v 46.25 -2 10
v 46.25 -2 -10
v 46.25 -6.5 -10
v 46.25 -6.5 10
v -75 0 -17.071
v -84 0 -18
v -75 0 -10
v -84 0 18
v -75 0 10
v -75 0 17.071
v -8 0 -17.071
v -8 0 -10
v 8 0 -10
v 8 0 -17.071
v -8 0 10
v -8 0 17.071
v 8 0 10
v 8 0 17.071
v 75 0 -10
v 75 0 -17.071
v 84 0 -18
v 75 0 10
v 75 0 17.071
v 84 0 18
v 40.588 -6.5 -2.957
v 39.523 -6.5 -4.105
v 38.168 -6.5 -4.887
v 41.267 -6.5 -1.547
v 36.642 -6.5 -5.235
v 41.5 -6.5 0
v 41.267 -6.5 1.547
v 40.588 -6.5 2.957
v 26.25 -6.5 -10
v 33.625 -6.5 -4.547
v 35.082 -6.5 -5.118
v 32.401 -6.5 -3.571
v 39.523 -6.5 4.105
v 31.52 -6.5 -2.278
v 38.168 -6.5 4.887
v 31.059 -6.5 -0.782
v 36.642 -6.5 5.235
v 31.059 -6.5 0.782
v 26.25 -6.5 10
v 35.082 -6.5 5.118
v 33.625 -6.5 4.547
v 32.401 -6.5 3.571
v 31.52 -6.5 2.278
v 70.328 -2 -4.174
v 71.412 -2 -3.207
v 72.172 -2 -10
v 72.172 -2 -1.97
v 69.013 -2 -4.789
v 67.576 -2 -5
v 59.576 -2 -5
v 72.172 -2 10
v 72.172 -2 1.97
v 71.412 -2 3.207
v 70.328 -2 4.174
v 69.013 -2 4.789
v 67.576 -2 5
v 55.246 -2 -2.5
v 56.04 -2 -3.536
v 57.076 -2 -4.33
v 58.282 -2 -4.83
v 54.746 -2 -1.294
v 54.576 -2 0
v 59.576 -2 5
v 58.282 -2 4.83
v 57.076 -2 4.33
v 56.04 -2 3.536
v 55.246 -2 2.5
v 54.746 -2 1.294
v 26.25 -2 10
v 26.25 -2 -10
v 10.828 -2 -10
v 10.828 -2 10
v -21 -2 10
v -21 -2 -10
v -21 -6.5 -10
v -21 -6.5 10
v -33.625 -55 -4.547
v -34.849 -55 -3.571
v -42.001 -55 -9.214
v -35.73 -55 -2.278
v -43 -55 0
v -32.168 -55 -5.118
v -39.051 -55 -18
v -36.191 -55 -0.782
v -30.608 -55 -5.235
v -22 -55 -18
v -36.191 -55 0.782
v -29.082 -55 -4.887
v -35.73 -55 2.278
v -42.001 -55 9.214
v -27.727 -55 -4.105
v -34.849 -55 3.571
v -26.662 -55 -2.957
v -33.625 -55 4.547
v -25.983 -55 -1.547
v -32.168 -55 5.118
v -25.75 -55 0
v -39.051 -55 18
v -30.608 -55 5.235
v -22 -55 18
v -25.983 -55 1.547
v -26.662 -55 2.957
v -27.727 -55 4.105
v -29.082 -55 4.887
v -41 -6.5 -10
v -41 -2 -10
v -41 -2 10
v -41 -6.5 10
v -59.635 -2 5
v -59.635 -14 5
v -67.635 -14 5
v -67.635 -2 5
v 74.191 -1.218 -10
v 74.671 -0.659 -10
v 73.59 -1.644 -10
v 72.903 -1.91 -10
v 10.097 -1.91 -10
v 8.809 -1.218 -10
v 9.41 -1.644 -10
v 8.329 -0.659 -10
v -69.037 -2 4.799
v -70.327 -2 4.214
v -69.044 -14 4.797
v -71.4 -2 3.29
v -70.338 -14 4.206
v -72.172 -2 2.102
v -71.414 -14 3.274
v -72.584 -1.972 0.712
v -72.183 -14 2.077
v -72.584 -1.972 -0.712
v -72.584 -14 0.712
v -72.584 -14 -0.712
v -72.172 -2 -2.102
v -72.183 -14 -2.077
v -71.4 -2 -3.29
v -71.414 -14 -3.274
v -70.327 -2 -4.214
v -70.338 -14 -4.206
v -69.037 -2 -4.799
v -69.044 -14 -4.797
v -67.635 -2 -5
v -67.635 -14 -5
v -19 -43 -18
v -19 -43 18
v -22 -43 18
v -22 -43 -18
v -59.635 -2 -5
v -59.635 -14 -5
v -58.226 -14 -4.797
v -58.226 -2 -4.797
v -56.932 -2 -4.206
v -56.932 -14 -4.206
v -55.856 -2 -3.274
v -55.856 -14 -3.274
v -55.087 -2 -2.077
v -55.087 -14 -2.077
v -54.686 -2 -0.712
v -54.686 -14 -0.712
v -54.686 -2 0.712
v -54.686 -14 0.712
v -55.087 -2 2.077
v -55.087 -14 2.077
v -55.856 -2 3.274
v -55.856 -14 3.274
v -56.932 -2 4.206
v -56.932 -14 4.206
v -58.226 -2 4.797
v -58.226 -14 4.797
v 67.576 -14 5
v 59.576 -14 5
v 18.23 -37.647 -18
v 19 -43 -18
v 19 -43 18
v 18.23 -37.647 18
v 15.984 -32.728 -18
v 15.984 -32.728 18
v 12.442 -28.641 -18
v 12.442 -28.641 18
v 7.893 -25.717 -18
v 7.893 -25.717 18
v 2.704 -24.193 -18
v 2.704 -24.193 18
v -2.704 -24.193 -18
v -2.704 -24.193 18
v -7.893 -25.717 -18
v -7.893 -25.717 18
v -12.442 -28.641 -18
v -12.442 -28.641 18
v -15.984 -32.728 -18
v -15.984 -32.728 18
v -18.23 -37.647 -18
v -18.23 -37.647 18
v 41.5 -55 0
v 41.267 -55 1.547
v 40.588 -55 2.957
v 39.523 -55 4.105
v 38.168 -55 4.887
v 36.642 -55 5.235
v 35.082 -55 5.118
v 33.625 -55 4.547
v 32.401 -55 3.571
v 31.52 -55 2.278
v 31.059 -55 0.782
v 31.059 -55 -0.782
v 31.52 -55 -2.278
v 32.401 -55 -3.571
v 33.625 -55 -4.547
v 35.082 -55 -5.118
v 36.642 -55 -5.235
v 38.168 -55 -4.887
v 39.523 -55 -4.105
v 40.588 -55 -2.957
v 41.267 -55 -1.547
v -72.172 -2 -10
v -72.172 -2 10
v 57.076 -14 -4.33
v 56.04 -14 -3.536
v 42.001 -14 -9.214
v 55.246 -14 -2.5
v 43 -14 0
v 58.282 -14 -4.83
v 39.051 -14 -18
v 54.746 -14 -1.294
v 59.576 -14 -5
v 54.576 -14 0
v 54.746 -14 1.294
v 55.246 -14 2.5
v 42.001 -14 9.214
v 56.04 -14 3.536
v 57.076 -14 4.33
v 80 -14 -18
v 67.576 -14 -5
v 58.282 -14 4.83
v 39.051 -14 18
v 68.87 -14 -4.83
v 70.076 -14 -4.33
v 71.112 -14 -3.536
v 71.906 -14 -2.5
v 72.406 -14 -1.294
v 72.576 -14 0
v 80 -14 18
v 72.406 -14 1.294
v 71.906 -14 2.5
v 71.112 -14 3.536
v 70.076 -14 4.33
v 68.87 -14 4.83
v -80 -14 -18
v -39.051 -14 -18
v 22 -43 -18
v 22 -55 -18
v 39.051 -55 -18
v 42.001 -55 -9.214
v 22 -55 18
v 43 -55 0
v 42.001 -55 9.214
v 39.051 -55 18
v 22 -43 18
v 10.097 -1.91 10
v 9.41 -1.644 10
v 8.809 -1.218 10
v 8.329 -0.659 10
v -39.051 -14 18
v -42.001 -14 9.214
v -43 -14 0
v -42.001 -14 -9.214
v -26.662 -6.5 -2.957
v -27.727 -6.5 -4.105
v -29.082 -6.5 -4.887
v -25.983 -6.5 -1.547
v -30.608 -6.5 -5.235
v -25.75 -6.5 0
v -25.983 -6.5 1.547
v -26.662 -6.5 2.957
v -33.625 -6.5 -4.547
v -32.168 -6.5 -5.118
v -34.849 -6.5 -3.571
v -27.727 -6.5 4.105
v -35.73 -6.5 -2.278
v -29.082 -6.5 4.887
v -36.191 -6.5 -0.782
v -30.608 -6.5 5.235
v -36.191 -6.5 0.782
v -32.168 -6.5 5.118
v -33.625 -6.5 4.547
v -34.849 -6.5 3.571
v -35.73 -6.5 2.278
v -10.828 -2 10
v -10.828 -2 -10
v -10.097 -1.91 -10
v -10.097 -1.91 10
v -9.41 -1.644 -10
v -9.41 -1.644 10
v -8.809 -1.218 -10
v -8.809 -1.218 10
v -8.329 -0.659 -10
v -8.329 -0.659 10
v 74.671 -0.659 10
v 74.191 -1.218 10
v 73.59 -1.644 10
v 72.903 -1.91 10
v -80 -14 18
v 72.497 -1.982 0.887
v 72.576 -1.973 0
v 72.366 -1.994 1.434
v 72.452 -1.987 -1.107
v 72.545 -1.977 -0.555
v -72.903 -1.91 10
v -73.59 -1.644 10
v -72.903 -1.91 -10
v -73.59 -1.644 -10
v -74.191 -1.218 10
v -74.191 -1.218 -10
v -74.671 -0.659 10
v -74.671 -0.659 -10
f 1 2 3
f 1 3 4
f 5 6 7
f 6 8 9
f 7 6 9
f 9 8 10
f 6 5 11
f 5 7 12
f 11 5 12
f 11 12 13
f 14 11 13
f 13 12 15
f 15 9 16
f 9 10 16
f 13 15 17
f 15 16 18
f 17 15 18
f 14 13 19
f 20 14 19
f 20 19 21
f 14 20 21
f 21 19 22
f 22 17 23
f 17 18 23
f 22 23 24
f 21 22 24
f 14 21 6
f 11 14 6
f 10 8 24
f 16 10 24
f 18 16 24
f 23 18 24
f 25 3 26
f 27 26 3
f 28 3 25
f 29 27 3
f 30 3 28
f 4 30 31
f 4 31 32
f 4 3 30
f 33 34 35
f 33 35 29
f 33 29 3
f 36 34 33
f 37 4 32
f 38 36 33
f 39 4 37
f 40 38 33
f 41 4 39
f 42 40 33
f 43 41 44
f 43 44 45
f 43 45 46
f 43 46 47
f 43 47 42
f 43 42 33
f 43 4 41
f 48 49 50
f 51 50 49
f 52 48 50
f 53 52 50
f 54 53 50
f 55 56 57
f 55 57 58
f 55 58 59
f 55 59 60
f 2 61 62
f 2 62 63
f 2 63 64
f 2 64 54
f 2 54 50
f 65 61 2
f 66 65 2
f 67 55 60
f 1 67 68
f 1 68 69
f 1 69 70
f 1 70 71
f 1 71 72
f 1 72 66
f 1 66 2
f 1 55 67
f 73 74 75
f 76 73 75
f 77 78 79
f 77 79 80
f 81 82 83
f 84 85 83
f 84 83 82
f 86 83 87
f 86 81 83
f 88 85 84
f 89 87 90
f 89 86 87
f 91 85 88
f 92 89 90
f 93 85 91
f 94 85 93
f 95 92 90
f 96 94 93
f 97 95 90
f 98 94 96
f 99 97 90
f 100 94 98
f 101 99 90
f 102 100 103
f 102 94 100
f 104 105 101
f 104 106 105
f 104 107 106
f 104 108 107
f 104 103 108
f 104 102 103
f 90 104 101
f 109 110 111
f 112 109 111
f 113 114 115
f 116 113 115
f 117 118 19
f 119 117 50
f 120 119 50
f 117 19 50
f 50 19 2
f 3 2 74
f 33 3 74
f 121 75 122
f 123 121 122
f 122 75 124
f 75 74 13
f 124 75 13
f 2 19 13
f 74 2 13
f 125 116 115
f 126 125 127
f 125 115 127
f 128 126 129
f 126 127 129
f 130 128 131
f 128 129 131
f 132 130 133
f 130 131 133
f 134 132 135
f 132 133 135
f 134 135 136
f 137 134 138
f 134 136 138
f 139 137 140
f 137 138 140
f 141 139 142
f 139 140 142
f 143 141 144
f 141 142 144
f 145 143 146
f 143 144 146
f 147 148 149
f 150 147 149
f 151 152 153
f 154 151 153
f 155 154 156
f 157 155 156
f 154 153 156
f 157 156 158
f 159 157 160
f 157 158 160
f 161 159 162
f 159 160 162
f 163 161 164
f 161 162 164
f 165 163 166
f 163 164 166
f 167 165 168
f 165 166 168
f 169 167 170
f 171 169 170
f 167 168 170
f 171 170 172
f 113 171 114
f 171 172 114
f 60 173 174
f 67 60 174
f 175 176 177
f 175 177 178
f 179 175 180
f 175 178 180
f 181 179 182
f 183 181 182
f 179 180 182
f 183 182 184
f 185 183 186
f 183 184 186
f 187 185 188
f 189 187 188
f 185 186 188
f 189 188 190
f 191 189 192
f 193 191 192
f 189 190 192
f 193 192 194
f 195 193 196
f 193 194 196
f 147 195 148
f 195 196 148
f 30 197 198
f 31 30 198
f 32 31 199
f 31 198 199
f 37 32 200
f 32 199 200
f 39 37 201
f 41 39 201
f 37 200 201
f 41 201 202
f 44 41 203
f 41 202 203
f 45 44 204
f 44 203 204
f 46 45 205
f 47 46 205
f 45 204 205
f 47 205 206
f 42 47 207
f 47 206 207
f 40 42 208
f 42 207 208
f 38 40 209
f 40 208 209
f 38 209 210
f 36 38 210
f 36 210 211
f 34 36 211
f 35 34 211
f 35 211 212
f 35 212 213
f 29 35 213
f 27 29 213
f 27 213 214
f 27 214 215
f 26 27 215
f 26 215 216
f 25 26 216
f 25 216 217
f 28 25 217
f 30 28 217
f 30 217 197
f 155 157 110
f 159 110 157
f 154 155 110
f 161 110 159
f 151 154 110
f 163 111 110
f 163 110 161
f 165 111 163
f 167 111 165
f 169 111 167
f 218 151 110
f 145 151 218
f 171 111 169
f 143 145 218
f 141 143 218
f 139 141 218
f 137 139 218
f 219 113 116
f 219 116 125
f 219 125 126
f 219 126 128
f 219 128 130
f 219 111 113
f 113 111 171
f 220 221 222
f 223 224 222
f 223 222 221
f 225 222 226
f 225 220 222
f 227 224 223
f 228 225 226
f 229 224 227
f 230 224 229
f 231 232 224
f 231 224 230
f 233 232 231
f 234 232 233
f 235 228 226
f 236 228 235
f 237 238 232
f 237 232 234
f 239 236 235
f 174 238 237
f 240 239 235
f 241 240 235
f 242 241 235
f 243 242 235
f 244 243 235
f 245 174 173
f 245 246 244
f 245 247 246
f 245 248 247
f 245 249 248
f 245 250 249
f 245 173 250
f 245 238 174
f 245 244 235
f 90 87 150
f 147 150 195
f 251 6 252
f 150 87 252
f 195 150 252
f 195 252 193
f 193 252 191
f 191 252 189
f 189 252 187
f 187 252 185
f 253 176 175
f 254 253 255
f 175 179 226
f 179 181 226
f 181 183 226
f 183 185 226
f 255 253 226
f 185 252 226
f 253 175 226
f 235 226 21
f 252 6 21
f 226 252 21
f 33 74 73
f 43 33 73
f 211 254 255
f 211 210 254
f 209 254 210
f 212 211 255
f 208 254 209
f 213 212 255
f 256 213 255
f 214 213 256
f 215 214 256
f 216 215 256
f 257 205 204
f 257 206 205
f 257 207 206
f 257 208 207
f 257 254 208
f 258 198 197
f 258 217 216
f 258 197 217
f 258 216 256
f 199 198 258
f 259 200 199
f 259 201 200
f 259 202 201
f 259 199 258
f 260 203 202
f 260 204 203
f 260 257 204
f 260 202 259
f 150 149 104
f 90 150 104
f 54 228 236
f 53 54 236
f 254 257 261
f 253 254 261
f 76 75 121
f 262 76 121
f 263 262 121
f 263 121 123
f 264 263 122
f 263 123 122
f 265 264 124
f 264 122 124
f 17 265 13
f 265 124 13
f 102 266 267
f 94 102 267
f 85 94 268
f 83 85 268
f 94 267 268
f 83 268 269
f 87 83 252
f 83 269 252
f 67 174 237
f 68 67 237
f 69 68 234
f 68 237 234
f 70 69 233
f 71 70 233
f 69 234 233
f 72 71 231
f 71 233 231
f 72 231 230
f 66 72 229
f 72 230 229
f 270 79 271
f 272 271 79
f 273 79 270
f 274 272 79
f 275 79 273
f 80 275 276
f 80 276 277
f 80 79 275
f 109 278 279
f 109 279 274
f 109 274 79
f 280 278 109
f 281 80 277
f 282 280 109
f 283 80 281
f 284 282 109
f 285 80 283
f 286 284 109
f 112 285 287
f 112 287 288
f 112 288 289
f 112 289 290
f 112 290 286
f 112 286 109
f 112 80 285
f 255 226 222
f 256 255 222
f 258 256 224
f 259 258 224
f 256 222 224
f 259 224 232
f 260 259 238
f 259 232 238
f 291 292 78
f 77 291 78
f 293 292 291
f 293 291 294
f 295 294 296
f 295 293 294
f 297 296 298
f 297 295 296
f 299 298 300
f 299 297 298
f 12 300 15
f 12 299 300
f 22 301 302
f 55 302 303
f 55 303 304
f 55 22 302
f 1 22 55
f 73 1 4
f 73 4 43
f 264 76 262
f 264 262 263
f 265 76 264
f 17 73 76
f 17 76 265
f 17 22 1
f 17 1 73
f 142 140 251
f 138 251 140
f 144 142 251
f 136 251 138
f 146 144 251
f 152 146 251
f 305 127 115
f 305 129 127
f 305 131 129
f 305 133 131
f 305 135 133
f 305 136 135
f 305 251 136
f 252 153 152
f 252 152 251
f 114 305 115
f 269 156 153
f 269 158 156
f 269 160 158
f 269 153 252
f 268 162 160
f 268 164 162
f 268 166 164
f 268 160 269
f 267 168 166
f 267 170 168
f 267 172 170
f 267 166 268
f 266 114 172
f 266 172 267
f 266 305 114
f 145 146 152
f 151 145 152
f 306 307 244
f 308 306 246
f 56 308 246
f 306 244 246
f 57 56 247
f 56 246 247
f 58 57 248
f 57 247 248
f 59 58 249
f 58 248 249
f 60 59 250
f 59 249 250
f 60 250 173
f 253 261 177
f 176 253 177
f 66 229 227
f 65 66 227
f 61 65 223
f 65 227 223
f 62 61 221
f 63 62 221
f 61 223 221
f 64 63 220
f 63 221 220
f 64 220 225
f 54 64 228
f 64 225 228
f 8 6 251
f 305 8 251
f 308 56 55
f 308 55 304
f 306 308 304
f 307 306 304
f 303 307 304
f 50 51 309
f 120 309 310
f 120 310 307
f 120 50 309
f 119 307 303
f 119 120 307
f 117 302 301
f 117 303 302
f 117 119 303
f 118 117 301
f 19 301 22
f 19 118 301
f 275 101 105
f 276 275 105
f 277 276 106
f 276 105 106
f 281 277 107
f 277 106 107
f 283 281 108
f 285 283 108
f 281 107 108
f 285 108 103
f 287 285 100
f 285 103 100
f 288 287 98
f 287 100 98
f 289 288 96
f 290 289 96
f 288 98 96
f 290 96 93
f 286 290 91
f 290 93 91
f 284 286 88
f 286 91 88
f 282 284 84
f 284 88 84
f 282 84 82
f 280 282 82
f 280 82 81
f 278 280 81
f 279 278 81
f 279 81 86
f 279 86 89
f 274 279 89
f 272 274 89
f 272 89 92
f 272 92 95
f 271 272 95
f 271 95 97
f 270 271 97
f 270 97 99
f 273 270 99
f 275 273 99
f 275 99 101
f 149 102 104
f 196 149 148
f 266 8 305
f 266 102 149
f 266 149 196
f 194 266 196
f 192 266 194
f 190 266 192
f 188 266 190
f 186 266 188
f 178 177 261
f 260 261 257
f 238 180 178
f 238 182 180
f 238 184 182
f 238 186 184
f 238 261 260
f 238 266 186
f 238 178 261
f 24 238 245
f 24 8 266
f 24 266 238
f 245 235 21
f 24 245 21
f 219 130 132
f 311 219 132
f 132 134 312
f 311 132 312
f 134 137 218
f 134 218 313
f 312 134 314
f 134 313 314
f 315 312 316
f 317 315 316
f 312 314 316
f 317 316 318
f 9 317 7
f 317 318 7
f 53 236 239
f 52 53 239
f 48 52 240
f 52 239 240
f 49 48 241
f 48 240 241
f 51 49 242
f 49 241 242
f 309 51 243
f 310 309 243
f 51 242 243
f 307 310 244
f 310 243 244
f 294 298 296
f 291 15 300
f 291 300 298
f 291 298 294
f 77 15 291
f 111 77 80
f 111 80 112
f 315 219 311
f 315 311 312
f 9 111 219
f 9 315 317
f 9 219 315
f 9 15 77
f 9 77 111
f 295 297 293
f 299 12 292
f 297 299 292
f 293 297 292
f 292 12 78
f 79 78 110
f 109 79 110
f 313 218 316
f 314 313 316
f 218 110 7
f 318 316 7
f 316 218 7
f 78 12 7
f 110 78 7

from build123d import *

# Parameters (mm, degrees)
F0_W         = 168
F0_H         = 36
F1_DEPTH     = 14
F3_DEPTH     = 36.001
F5_DEPTH     = 41
F6_R         = 5.25
F7_DEPTH     = 55.001
F8_W         = 20
F8_H         = 20
F9_DEPTH     = 6.5
F10_W        = 67
F10_H        = 20
F11_DEPTH    = 2
F12_T1_DEPTH = 34.1421356237
F14_DEPTH    = 25
F16_DEPTH    = 36.001


# Not quite as in the source:
# - a fillet or chamfer that OpenCascade refuses, or shapes differently, is made with other operations: its cross-section is extruded or revolved along the edge and cut away or added


with BuildPart() as f1:
    # F0 (on Front) → F1 (new body)
    with BuildSketch(Plane.XZ):
        Rectangle(F0_W, F0_H)
    extrude(amount=F1_DEPTH)

    # F2 (on face) → F3 (cut, through all)
    with BuildSketch(Plane(origin=(0, 0, -18), x_dir=(1, 0, 0), z_dir=(0, 0, -1))):
        Polygon((-84, 14), (-84, 0), (-80, 14), align=None)
        Polygon((80, 14), (84, 0), (84, 14), align=None)
    extrude(amount=-F3_DEPTH, mode=Mode.SUBTRACT)

    # F4 (on face) → F5 (join)
    with BuildSketch(Plane.XZ.offset(14)):
        with BuildLine():
            ThreePointArc((39.0512483795, -18), (43, 0), (39.0512483795, 18))
            Line((39.0512483795, 18), (-39.0512483795, 18))
            ThreePointArc((-39.0512483795, 18), (-43, 0), (-39.0512483795, -18))
            Line((-39.0512483795, -18), (39.0512483795, -18))
        make_face()
    extrude(amount=F5_DEPTH)

    # F6 (on face) → F7 (cut, through all)
    with BuildSketch(Plane.XZ.offset(55)):
        with Locations((36.25, 0)):
            Circle(F6_R)
        with Locations((-31, 0)):
            Circle(F6_R)
    extrude(amount=-F7_DEPTH, mode=Mode.SUBTRACT)

    # F8 (on face) → F9 (cut)
    with BuildSketch(Plane(origin=(0, 0, 0), x_dir=(-1, 0, 0), z_dir=(0, 1, 0))):
        with Locations((-36.25, 0)):
            Rectangle(F8_W, F8_H)
        with Locations((31, 0)):
            Rectangle(F8_W, F8_H)
    extrude(amount=-F9_DEPTH, mode=Mode.SUBTRACT)

    # F10 (on face) → F11 (cut)
    with BuildSketch(Plane(origin=(0, 0, 0), x_dir=(-1, 0, 0), z_dir=(0, 1, 0))):
        with Locations((41.5, 0)):
            Rectangle(F10_W, F10_H)
        with Locations((-41.5, 0)):
            Rectangle(F10_W, F10_H)
    extrude(amount=-F11_DEPTH, mode=Mode.SUBTRACT)

    # F12: fillet of radius 3 on 4 edges, made by hand

    # F12_s2 → F12_t1 (join)
    with BuildSketch(Plane.XY.offset(-17.0710678119)):
        with BuildLine():
            ThreePointArc((72.1715728753, -2), (73.9036236828, -1.4494897428), (75, 0))
            Line((75, 0), (75, -2))
            Line((75, -2), (72.1715728753, -2))
        make_face()
        with BuildLine():
            ThreePointArc((10.8284271247, -2), (9.0963763172, -1.4494897428), (8, 0))
            Line((8, 0), (8, -2))
            Line((8, -2), (10.8284271247, -2))
        make_face()
        with BuildLine():
            ThreePointArc((-72.1715728753, -2), (-73.9036236828, -1.4494897428), (-75, 0))
            Line((-75, 0), (-75, -2))
            Line((-75, -2), (-72.1715728753, -2))
        make_face()
        with BuildLine():
            ThreePointArc((-10.8284271247, -2), (-9.0963763172, -1.4494897428), (-8, 0))
            Line((-8, 0), (-8, -2))
            Line((-8, -2), (-10.8284271247, -2))
        make_face()
    extrude(amount=F12_T1_DEPTH)

    # F13 (on face) → F14 (cut)
    with BuildSketch(Plane.XZ.offset(14)):
        with BuildLine():
            ThreePointArc((-67.6350200021, 5), (-72.6350200021, 0), (-67.6350200021, -5))
            Line((-67.6350200021, -5), (-59.6350200021, -5))
            ThreePointArc((-59.6350200021, -5), (-54.6350200021, 0), (-59.6350200021, 5))
            Line((-59.6350200021, 5), (-67.6350200021, 5))
        make_face()
        with BuildLine():
            ThreePointArc((54.5760053992, 0), (56.0404714933, -3.5355339059), (59.5760053992, -5))
            Line((59.5760053992, -5), (67.5760053992, -5))
            ThreePointArc((67.5760053992, -5), (71.1115393052, -3.5355339059), (72.5760053992, 0))
            ThreePointArc((72.5760053992, 0), (71.1115393052, 3.5355339059), (67.5760053992, 5))
            Line((67.5760053992, 5), (59.5760053992, 5))
            ThreePointArc((59.5760053992, 5), (56.0404714933, 3.5355339059), (54.5760053992, 0))
        make_face()
    extrude(amount=-F14_DEPTH, mode=Mode.SUBTRACT)

    # F15 (on face) → F16 (cut, through all)
    with BuildSketch(Plane.XY.offset(18)):
        with BuildLine():
            Line((22, -43), (19, -43))
            ThreePointArc((19, -43), (0, -24), (-19, -43))
            Line((-19, -43), (-22, -43))
            Line((-22, -43), (-22, -55))
            Line((-22, -55), (0, -55))
            Line((0, -55), (22, -55))
            Line((22, -55), (22, -43))
        make_face()
    extrude(amount=-F16_DEPTH, mode=Mode.SUBTRACT)


solid = f1.part
